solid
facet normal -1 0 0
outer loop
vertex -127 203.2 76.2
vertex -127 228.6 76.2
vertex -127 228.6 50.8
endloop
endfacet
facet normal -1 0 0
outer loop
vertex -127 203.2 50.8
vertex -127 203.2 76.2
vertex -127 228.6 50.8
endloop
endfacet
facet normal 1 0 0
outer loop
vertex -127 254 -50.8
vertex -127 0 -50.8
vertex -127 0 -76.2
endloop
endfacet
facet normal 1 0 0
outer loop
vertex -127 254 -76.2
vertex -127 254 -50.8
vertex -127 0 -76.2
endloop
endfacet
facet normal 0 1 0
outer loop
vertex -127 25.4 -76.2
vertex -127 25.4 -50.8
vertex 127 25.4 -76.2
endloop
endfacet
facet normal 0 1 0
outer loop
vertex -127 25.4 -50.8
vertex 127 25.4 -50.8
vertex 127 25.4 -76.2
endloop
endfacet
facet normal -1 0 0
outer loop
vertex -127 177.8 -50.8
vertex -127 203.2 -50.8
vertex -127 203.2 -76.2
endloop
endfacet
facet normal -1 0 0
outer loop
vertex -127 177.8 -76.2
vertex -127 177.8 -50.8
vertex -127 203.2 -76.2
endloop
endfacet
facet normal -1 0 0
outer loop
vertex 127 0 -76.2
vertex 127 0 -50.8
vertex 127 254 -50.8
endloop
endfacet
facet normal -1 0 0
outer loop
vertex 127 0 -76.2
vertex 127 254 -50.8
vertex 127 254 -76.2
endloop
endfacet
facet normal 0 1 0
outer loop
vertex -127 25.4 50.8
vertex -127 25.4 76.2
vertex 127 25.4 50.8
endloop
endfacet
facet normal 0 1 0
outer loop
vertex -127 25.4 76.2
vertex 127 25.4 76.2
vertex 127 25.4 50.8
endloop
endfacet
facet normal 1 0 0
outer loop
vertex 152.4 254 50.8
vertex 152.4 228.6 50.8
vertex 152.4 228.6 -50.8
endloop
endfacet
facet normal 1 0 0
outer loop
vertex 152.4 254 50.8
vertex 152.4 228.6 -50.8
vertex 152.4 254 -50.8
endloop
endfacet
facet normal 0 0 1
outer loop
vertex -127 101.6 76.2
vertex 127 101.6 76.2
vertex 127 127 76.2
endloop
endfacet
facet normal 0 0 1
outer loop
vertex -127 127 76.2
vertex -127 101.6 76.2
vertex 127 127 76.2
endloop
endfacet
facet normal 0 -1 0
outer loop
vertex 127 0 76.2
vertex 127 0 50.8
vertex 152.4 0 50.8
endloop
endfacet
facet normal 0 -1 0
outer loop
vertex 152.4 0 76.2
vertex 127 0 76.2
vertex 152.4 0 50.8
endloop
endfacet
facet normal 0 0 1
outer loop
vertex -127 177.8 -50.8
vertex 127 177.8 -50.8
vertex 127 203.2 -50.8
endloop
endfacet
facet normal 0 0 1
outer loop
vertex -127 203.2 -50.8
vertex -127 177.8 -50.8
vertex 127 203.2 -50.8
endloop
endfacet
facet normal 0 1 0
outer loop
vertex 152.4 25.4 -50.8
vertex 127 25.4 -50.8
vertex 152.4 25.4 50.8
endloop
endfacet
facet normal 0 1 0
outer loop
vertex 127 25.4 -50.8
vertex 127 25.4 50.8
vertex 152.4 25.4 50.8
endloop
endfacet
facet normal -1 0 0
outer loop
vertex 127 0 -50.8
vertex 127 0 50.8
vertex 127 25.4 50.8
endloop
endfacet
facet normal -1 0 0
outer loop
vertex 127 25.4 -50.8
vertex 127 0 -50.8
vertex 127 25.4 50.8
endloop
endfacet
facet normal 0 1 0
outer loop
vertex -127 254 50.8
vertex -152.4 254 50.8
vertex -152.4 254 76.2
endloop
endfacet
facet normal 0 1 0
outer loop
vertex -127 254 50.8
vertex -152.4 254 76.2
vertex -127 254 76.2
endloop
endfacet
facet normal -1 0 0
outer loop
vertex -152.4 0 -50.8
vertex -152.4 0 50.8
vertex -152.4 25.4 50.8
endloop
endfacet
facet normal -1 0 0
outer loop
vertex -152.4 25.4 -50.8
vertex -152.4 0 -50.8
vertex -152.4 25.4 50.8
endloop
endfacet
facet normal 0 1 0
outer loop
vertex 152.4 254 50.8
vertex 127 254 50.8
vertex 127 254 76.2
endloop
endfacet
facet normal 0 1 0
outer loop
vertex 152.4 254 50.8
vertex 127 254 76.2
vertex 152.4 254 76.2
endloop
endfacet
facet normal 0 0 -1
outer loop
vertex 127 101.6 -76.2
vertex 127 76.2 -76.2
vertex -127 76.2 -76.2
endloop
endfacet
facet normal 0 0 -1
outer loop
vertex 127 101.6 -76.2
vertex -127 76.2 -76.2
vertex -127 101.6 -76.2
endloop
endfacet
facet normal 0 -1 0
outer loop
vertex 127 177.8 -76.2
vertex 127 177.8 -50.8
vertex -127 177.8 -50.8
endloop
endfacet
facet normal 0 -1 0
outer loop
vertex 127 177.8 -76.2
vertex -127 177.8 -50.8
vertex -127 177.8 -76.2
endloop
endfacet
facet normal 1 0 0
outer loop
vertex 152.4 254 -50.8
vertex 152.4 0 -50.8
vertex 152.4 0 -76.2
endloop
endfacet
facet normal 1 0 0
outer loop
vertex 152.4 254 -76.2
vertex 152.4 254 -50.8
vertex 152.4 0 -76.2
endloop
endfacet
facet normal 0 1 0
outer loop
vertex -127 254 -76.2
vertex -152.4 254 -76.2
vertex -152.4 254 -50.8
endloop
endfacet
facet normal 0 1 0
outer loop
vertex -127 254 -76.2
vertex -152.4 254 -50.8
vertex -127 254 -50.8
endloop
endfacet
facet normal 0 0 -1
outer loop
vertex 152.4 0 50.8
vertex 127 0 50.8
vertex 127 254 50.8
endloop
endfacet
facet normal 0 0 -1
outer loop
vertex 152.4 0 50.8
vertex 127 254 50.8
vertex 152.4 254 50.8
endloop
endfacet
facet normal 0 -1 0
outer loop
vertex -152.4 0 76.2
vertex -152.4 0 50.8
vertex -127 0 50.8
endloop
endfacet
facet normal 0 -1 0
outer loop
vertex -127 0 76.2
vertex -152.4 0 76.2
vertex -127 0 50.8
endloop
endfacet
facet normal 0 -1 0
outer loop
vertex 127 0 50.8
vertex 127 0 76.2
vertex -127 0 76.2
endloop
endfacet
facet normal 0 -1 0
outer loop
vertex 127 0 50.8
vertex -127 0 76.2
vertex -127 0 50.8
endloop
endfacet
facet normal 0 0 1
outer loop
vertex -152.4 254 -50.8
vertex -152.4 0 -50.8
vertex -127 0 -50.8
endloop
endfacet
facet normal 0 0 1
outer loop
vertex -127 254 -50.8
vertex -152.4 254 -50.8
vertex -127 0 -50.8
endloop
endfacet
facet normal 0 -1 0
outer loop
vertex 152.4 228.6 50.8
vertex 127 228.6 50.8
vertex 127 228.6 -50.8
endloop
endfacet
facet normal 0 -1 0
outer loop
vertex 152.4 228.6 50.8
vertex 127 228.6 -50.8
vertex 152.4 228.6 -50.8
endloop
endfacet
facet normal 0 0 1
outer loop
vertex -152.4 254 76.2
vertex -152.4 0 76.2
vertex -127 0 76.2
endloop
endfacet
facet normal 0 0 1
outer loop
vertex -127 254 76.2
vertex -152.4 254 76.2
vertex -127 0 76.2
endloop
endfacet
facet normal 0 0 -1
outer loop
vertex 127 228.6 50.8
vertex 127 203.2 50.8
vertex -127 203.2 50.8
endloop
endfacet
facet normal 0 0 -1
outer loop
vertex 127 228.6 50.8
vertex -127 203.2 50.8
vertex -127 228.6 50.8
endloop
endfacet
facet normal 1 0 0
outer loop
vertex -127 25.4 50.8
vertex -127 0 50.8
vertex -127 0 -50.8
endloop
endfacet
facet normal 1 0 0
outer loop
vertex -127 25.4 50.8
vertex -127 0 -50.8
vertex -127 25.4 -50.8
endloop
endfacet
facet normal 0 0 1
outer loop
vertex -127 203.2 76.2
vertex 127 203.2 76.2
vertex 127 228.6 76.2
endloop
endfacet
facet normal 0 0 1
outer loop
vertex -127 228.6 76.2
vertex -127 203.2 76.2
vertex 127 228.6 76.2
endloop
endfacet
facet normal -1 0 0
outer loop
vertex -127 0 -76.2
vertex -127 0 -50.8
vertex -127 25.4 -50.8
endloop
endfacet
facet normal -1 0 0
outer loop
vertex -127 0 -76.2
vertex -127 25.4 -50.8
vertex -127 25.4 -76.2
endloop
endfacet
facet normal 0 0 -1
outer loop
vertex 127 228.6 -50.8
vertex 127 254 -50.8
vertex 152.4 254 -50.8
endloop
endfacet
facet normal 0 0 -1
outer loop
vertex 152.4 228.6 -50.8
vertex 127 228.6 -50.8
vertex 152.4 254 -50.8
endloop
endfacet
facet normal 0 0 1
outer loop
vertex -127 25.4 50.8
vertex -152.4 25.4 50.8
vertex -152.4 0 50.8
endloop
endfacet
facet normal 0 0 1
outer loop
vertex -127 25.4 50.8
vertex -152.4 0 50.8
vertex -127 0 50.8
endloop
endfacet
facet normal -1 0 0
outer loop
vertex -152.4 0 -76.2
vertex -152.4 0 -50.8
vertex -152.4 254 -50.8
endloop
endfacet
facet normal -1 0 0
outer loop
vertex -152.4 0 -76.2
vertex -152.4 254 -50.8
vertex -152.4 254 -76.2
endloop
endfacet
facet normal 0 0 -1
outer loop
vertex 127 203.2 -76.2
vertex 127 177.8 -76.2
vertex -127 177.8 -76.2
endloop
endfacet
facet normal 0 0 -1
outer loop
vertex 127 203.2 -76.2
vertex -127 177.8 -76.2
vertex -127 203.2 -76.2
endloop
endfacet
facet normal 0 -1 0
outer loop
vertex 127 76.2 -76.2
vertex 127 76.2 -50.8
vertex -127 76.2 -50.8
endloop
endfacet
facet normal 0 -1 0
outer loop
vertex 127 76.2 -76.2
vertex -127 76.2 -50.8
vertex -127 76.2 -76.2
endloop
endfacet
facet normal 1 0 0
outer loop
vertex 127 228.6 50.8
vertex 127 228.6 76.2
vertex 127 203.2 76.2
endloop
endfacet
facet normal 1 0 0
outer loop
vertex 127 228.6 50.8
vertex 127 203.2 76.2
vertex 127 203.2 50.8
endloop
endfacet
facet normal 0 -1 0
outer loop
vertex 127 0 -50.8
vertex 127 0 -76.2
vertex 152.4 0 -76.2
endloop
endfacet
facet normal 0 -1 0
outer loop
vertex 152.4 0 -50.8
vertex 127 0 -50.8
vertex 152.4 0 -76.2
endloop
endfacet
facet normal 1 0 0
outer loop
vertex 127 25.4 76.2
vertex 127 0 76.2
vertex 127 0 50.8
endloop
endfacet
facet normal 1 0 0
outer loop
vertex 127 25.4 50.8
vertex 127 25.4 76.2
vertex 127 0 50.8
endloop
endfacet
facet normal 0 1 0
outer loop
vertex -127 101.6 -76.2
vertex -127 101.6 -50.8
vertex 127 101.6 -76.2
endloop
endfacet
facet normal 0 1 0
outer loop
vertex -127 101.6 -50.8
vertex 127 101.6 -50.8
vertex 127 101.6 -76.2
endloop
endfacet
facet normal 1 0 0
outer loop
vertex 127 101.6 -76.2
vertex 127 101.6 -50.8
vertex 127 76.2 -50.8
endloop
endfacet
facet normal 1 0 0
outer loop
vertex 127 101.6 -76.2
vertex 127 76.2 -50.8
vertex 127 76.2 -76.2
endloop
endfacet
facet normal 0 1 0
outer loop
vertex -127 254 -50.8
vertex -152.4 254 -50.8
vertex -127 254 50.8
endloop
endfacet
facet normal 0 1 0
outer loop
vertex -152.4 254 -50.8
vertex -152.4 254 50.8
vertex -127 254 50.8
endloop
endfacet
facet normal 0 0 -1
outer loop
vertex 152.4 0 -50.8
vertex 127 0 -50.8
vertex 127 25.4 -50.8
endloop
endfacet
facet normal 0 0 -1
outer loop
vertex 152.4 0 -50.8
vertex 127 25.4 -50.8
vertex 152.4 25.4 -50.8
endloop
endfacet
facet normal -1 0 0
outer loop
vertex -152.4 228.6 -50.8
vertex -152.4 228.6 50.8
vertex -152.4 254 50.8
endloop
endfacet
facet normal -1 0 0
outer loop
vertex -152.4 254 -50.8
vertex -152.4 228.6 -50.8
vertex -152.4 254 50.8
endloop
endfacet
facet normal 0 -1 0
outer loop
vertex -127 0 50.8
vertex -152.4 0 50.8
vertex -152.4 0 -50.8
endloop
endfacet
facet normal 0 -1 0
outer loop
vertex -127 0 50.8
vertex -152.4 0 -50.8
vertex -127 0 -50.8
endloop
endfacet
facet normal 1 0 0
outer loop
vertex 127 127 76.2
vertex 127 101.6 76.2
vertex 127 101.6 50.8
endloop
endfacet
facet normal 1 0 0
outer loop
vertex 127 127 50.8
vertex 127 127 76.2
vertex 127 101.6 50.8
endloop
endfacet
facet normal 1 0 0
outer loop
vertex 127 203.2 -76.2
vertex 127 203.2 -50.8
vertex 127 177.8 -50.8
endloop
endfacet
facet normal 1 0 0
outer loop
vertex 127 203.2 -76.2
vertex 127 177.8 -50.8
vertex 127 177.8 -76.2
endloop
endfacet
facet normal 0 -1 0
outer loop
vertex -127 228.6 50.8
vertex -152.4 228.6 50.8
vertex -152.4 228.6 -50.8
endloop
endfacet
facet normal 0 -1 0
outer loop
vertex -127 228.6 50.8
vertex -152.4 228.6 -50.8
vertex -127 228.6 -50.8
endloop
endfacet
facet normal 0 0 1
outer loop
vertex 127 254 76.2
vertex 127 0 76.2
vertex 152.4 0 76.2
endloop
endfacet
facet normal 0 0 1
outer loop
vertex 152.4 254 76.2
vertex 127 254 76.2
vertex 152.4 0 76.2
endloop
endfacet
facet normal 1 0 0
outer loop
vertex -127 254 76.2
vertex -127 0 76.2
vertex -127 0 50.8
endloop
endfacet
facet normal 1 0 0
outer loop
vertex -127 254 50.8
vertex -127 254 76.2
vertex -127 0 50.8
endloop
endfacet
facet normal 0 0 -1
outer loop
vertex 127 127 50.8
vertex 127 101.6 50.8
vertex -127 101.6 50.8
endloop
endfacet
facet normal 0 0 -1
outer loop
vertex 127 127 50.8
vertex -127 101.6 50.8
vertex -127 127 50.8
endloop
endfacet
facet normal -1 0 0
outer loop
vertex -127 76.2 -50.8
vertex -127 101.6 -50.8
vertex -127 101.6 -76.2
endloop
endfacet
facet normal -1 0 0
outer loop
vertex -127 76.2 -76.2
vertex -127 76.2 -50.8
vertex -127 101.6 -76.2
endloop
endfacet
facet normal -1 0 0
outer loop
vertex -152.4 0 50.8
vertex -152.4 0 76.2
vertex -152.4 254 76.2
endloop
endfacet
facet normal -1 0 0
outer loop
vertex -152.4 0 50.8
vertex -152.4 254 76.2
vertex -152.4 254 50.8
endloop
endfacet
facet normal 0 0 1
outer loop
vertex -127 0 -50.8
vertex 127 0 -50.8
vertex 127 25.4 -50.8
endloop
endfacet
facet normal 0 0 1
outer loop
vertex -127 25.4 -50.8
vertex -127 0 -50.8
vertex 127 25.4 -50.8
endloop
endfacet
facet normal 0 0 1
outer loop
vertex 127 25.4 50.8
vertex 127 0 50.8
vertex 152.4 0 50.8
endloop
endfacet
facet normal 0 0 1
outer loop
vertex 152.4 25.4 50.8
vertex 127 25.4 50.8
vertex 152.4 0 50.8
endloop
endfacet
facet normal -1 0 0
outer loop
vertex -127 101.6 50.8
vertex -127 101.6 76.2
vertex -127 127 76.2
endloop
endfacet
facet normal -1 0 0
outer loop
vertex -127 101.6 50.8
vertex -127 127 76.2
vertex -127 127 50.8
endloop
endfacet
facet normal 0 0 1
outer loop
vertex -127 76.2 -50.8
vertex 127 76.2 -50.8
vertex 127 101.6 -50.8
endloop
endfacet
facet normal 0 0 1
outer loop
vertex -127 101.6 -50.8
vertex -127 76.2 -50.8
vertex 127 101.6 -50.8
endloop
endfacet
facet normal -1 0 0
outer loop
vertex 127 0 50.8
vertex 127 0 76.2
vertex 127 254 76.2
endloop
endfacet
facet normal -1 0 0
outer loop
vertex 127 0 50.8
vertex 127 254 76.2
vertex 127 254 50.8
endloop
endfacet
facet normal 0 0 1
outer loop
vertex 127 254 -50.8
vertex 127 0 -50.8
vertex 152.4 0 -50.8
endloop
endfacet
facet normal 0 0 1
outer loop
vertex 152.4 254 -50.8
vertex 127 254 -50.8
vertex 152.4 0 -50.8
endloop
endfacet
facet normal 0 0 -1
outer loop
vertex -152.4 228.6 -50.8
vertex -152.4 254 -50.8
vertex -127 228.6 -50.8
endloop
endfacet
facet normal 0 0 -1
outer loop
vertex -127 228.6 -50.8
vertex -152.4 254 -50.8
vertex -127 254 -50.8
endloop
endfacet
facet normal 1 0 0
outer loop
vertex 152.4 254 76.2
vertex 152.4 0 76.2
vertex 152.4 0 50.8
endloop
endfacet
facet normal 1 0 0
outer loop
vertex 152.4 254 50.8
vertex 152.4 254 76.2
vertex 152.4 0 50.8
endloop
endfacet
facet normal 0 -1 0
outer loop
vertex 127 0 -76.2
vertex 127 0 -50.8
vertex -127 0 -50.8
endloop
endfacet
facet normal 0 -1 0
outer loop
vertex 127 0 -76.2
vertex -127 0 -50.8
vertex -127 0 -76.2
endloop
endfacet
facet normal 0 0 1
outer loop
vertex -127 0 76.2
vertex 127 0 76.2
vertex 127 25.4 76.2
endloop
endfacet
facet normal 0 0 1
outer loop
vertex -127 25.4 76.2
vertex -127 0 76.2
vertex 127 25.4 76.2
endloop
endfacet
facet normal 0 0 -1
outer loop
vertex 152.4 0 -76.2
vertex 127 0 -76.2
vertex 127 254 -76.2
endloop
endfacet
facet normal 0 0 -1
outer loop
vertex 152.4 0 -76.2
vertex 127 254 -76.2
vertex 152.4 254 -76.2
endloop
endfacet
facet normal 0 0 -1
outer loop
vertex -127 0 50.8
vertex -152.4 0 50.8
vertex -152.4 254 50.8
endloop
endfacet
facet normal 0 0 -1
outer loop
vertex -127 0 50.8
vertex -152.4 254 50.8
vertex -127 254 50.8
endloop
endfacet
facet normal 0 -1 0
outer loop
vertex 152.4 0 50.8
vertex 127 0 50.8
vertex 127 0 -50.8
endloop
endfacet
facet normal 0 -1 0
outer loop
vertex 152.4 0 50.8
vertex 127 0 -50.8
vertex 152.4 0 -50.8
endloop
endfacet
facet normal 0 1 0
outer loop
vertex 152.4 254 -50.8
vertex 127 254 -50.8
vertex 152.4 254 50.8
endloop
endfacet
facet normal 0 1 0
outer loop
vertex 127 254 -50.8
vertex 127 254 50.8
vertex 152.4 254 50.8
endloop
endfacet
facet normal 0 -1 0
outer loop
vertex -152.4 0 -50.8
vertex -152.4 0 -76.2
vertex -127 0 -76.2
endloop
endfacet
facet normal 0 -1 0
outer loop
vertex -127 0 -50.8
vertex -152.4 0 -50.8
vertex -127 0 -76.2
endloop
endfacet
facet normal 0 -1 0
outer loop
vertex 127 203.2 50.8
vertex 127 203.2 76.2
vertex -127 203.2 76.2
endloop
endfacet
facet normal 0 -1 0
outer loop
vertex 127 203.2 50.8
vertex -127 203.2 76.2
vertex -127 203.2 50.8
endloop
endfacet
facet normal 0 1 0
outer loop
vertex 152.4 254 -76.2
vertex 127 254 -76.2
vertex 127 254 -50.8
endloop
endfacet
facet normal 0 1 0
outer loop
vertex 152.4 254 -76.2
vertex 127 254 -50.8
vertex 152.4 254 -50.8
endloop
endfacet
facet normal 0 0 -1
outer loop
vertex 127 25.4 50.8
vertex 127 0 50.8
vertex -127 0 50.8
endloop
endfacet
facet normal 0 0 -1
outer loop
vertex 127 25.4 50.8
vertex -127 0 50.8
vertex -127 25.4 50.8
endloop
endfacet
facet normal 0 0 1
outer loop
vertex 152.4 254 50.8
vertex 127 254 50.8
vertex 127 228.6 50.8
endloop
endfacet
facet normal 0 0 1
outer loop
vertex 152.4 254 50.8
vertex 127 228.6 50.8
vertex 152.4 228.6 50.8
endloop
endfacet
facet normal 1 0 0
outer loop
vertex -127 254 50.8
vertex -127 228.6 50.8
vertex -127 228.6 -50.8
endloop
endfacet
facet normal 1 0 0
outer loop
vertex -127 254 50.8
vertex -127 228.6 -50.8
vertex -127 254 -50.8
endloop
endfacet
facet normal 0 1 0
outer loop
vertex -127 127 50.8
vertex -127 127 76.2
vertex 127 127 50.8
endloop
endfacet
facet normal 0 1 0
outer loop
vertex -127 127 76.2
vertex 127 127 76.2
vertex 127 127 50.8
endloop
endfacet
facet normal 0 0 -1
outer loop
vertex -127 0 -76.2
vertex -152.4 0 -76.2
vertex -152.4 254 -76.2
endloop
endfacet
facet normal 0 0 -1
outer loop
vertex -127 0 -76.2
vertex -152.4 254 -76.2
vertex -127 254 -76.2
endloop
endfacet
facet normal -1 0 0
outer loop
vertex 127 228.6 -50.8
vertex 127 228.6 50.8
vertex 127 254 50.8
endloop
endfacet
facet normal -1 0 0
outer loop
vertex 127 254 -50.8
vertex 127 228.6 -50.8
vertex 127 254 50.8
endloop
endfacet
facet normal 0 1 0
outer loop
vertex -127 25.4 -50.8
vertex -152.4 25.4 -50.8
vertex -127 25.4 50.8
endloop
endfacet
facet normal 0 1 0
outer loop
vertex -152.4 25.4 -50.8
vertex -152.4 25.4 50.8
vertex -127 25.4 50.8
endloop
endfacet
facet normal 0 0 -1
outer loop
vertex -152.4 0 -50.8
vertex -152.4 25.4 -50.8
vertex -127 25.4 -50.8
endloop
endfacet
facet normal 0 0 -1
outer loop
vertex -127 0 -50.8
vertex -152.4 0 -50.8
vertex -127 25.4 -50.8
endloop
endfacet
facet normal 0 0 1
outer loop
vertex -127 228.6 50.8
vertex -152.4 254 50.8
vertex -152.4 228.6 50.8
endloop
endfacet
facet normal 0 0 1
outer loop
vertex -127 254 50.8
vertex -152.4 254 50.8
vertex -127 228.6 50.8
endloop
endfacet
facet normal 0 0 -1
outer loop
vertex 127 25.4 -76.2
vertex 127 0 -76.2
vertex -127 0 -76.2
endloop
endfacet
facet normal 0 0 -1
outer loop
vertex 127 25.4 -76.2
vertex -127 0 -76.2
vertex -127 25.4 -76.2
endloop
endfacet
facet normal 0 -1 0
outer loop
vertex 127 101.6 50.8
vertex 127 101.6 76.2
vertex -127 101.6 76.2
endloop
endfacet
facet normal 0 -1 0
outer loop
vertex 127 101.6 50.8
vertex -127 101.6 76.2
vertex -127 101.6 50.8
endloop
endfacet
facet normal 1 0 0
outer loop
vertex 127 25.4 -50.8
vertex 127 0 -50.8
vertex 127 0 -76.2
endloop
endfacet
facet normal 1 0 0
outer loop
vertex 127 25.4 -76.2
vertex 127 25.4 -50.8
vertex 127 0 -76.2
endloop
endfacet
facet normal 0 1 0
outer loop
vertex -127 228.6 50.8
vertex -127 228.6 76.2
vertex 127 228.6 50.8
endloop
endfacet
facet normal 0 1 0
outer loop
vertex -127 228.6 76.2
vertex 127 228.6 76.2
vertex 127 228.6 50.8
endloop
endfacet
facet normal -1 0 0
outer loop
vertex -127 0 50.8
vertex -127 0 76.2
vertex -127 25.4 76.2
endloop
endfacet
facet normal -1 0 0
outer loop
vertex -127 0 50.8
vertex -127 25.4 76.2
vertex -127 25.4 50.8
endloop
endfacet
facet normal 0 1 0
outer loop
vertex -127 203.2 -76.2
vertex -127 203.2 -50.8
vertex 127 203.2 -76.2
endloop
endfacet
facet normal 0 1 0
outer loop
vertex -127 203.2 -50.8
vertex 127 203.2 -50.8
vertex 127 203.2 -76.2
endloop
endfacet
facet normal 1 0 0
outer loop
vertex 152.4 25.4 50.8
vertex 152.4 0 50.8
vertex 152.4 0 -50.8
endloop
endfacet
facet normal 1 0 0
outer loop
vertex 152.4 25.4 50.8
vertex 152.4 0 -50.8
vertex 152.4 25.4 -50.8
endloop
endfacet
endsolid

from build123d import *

# Parameters (mm, degrees)
SKETCH1_W                  = 25.4
SKETCH1_H                  = 25.4
BOSS_EXTRUDE1_DEPTH        = 254
BOSS_EXTRUDE1_2_DEPTH      = 254
BOSS_EXTRUDE1_3_DEPTH      = 254
BOSS_EXTRUDE1_4_DEPTH      = 254
SKETCH2_W                  = 25.4
SKETCH2_H                  = 25.4
BOSS_EXTRUDE2_DEPTH        = 127
BOSS_EXTRUDE2_DEPTH_BACK   = 127
BOSS_EXTRUDE2_2_DEPTH      = 127
BOSS_EXTRUDE2_2_DEPTH_BACK = 127
BOSS_EXTRUDE2_3_DEPTH      = 127
BOSS_EXTRUDE2_3_DEPTH_BACK = 127
BOSS_EXTRUDE2_4_DEPTH      = 127
BOSS_EXTRUDE2_4_DEPTH_BACK = 127
BOSS_EXTRUDE2_5_DEPTH      = 127
BOSS_EXTRUDE2_5_DEPTH_BACK = 127
BOSS_EXTRUDE2_6_DEPTH      = 127
BOSS_EXTRUDE2_6_DEPTH_BACK = 127
SKETCH3_W                  = 25.4
SKETCH3_H                  = 25.4
BOSS_EXTRUDE3_DEPTH        = 50.8
BOSS_EXTRUDE3_DEPTH_BACK   = 50.8
BOSS_EXTRUDE3_2_DEPTH      = 50.8
BOSS_EXTRUDE3_2_DEPTH_BACK = 50.8
BOSS_EXTRUDE3_3_DEPTH      = 50.8
BOSS_EXTRUDE3_3_DEPTH_BACK = 50.8
BOSS_EXTRUDE3_4_DEPTH      = 50.8
BOSS_EXTRUDE3_4_DEPTH_BACK = 50.8


with BuildPart() as part:
    # Sketch1 → Boss-Extrude1 (new body)
    with BuildSketch(Plane(origin=(0, 0, 0), x_dir=(1, 0, 0), z_dir=(0, 1, 0))):
        with Locations((-139.7, 63.5)):
            Rectangle(SKETCH1_W, SKETCH1_H)
    extrude(amount=BOSS_EXTRUDE1_DEPTH)


with BuildPart() as body_2:
    # Sketch1 → Boss-Extrude1 2 (new body)
    with BuildSketch(Plane(origin=(0, 0, 0), x_dir=(1, 0, 0), z_dir=(0, 1, 0))):
        with Locations((-139.7, -63.5)):
            Rectangle(SKETCH1_W, SKETCH1_H)
    extrude(amount=BOSS_EXTRUDE1_2_DEPTH)


with BuildPart() as body_3:
    # Sketch1 → Boss-Extrude1 3 (new body)
    with BuildSketch(Plane(origin=(0, 0, 0), x_dir=(1, 0, 0), z_dir=(0, 1, 0))):
        with Locations((139.7, -63.5)):
            Rectangle(SKETCH1_W, SKETCH1_H)
    extrude(amount=BOSS_EXTRUDE1_3_DEPTH)


with BuildPart() as body_4:
    # Sketch1 → Boss-Extrude1 4 (new body)
    with BuildSketch(Plane(origin=(0, 0, 0), x_dir=(1, 0, 0), z_dir=(0, 1, 0))):
        with Locations((139.7, 63.5)):
            Rectangle(SKETCH1_W, SKETCH1_H)
    extrude(amount=BOSS_EXTRUDE1_4_DEPTH)


with BuildPart() as body_5:
    # Sketch2 → Boss-Extrude2 (new body, two sides)
    with BuildSketch(Plane(origin=(0, 0, 0), x_dir=(0, 0, -1), z_dir=(1, 0, 0))) as boss_extrude2_sk:
        with Locations((-63.5, 215.9)):
            Rectangle(SKETCH2_W, SKETCH2_H)
    extrude(amount=BOSS_EXTRUDE2_DEPTH)
    extrude(boss_extrude2_sk.sketch, amount=-BOSS_EXTRUDE2_DEPTH_BACK)


with BuildPart() as body_6:
    # Sketch2 → Boss-Extrude2 2 (new body, two sides)
    with BuildSketch(Plane(origin=(0, 0, 0), x_dir=(0, 0, -1), z_dir=(1, 0, 0))) as boss_extrude2_2_sk:
        with Locations((63.5, 190.5)):
            Rectangle(SKETCH2_W, SKETCH2_H)
    extrude(amount=BOSS_EXTRUDE2_2_DEPTH)
    extrude(boss_extrude2_2_sk.sketch, amount=-BOSS_EXTRUDE2_2_DEPTH_BACK)


with BuildPart() as body_7:
    # Sketch2 → Boss-Extrude2 3 (new body, two sides)
    with BuildSketch(Plane(origin=(0, 0, 0), x_dir=(0, 0, -1), z_dir=(1, 0, 0))) as boss_extrude2_3_sk:
        with Locations((-63.5, 12.7)):
            Rectangle(SKETCH2_W, SKETCH2_H)
    extrude(amount=BOSS_EXTRUDE2_3_DEPTH)
    extrude(boss_extrude2_3_sk.sketch, amount=-BOSS_EXTRUDE2_3_DEPTH_BACK)


with BuildPart() as body_8:
    # Sketch2 → Boss-Extrude2 4 (new body, two sides)
    with BuildSketch(Plane(origin=(0, 0, 0), x_dir=(0, 0, -1), z_dir=(1, 0, 0))) as boss_extrude2_4_sk:
        with Locations((63.5, 12.7)):
            Rectangle(SKETCH2_W, SKETCH2_H)
    extrude(amount=BOSS_EXTRUDE2_4_DEPTH)
    extrude(boss_extrude2_4_sk.sketch, amount=-BOSS_EXTRUDE2_4_DEPTH_BACK)


with BuildPart() as body_9:
    # Sketch2 → Boss-Extrude2 5 (new body, two sides)
    with BuildSketch(Plane(origin=(0, 0, 0), x_dir=(0, 0, -1), z_dir=(1, 0, 0))) as boss_extrude2_5_sk:
        with Locations((-63.5, 114.3)):
            Rectangle(SKETCH2_W, SKETCH2_H)
    extrude(amount=BOSS_EXTRUDE2_5_DEPTH)
    extrude(boss_extrude2_5_sk.sketch, amount=-BOSS_EXTRUDE2_5_DEPTH_BACK)


with BuildPart() as body_10:
    # Sketch2 → Boss-Extrude2 6 (new body, two sides)
    with BuildSketch(Plane(origin=(0, 0, 0), x_dir=(0, 0, -1), z_dir=(1, 0, 0))) as boss_extrude2_6_sk:
        with Locations((63.5, 88.9)):
            Rectangle(SKETCH2_W, SKETCH2_H)
    extrude(amount=BOSS_EXTRUDE2_6_DEPTH)
    extrude(boss_extrude2_6_sk.sketch, amount=-BOSS_EXTRUDE2_6_DEPTH_BACK)


with BuildPart() as body_11:
    # Sketch3 → Boss-Extrude3 (new body, two sides)
    with BuildSketch(Plane.XY) as boss_extrude3_sk:
        with Locations((-139.7, 241.3)):
            Rectangle(SKETCH3_W, SKETCH3_H)
    extrude(amount=BOSS_EXTRUDE3_DEPTH)
    extrude(boss_extrude3_sk.sketch, amount=-BOSS_EXTRUDE3_DEPTH_BACK)


with BuildPart() as body_12:
    # Sketch3 → Boss-Extrude3 2 (new body, two sides)
    with BuildSketch(Plane.XY) as boss_extrude3_2_sk:
        with Locations((-139.7, 12.7)):
            Rectangle(SKETCH3_W, SKETCH3_H)
    extrude(amount=BOSS_EXTRUDE3_2_DEPTH)
    extrude(boss_extrude3_2_sk.sketch, amount=-BOSS_EXTRUDE3_2_DEPTH_BACK)


with BuildPart() as body_13:
    # Sketch3 → Boss-Extrude3 3 (new body, two sides)
    with BuildSketch(Plane.XY) as boss_extrude3_3_sk:
        with Locations((139.7, 241.3)):
            Rectangle(SKETCH3_W, SKETCH3_H)
    extrude(amount=BOSS_EXTRUDE3_3_DEPTH)
    extrude(boss_extrude3_3_sk.sketch, amount=-BOSS_EXTRUDE3_3_DEPTH_BACK)


with BuildPart() as body_14:
    # Sketch3 → Boss-Extrude3 4 (new body, two sides)
    with BuildSketch(Plane.XY) as boss_extrude3_4_sk:
        with Locations((139.7, 12.7)):
            Rectangle(SKETCH3_W, SKETCH3_H)
    extrude(amount=BOSS_EXTRUDE3_4_DEPTH)
    extrude(boss_extrude3_4_sk.sketch, amount=-BOSS_EXTRUDE3_4_DEPTH_BACK)


solid = Compound([part.part, body_2.part, body_3.part, body_4.part, body_5.part, body_6.part, body_7.part, body_8.part, body_9.part, body_10.part, body_11.part, body_12.part, body_13.part, body_14.part])
